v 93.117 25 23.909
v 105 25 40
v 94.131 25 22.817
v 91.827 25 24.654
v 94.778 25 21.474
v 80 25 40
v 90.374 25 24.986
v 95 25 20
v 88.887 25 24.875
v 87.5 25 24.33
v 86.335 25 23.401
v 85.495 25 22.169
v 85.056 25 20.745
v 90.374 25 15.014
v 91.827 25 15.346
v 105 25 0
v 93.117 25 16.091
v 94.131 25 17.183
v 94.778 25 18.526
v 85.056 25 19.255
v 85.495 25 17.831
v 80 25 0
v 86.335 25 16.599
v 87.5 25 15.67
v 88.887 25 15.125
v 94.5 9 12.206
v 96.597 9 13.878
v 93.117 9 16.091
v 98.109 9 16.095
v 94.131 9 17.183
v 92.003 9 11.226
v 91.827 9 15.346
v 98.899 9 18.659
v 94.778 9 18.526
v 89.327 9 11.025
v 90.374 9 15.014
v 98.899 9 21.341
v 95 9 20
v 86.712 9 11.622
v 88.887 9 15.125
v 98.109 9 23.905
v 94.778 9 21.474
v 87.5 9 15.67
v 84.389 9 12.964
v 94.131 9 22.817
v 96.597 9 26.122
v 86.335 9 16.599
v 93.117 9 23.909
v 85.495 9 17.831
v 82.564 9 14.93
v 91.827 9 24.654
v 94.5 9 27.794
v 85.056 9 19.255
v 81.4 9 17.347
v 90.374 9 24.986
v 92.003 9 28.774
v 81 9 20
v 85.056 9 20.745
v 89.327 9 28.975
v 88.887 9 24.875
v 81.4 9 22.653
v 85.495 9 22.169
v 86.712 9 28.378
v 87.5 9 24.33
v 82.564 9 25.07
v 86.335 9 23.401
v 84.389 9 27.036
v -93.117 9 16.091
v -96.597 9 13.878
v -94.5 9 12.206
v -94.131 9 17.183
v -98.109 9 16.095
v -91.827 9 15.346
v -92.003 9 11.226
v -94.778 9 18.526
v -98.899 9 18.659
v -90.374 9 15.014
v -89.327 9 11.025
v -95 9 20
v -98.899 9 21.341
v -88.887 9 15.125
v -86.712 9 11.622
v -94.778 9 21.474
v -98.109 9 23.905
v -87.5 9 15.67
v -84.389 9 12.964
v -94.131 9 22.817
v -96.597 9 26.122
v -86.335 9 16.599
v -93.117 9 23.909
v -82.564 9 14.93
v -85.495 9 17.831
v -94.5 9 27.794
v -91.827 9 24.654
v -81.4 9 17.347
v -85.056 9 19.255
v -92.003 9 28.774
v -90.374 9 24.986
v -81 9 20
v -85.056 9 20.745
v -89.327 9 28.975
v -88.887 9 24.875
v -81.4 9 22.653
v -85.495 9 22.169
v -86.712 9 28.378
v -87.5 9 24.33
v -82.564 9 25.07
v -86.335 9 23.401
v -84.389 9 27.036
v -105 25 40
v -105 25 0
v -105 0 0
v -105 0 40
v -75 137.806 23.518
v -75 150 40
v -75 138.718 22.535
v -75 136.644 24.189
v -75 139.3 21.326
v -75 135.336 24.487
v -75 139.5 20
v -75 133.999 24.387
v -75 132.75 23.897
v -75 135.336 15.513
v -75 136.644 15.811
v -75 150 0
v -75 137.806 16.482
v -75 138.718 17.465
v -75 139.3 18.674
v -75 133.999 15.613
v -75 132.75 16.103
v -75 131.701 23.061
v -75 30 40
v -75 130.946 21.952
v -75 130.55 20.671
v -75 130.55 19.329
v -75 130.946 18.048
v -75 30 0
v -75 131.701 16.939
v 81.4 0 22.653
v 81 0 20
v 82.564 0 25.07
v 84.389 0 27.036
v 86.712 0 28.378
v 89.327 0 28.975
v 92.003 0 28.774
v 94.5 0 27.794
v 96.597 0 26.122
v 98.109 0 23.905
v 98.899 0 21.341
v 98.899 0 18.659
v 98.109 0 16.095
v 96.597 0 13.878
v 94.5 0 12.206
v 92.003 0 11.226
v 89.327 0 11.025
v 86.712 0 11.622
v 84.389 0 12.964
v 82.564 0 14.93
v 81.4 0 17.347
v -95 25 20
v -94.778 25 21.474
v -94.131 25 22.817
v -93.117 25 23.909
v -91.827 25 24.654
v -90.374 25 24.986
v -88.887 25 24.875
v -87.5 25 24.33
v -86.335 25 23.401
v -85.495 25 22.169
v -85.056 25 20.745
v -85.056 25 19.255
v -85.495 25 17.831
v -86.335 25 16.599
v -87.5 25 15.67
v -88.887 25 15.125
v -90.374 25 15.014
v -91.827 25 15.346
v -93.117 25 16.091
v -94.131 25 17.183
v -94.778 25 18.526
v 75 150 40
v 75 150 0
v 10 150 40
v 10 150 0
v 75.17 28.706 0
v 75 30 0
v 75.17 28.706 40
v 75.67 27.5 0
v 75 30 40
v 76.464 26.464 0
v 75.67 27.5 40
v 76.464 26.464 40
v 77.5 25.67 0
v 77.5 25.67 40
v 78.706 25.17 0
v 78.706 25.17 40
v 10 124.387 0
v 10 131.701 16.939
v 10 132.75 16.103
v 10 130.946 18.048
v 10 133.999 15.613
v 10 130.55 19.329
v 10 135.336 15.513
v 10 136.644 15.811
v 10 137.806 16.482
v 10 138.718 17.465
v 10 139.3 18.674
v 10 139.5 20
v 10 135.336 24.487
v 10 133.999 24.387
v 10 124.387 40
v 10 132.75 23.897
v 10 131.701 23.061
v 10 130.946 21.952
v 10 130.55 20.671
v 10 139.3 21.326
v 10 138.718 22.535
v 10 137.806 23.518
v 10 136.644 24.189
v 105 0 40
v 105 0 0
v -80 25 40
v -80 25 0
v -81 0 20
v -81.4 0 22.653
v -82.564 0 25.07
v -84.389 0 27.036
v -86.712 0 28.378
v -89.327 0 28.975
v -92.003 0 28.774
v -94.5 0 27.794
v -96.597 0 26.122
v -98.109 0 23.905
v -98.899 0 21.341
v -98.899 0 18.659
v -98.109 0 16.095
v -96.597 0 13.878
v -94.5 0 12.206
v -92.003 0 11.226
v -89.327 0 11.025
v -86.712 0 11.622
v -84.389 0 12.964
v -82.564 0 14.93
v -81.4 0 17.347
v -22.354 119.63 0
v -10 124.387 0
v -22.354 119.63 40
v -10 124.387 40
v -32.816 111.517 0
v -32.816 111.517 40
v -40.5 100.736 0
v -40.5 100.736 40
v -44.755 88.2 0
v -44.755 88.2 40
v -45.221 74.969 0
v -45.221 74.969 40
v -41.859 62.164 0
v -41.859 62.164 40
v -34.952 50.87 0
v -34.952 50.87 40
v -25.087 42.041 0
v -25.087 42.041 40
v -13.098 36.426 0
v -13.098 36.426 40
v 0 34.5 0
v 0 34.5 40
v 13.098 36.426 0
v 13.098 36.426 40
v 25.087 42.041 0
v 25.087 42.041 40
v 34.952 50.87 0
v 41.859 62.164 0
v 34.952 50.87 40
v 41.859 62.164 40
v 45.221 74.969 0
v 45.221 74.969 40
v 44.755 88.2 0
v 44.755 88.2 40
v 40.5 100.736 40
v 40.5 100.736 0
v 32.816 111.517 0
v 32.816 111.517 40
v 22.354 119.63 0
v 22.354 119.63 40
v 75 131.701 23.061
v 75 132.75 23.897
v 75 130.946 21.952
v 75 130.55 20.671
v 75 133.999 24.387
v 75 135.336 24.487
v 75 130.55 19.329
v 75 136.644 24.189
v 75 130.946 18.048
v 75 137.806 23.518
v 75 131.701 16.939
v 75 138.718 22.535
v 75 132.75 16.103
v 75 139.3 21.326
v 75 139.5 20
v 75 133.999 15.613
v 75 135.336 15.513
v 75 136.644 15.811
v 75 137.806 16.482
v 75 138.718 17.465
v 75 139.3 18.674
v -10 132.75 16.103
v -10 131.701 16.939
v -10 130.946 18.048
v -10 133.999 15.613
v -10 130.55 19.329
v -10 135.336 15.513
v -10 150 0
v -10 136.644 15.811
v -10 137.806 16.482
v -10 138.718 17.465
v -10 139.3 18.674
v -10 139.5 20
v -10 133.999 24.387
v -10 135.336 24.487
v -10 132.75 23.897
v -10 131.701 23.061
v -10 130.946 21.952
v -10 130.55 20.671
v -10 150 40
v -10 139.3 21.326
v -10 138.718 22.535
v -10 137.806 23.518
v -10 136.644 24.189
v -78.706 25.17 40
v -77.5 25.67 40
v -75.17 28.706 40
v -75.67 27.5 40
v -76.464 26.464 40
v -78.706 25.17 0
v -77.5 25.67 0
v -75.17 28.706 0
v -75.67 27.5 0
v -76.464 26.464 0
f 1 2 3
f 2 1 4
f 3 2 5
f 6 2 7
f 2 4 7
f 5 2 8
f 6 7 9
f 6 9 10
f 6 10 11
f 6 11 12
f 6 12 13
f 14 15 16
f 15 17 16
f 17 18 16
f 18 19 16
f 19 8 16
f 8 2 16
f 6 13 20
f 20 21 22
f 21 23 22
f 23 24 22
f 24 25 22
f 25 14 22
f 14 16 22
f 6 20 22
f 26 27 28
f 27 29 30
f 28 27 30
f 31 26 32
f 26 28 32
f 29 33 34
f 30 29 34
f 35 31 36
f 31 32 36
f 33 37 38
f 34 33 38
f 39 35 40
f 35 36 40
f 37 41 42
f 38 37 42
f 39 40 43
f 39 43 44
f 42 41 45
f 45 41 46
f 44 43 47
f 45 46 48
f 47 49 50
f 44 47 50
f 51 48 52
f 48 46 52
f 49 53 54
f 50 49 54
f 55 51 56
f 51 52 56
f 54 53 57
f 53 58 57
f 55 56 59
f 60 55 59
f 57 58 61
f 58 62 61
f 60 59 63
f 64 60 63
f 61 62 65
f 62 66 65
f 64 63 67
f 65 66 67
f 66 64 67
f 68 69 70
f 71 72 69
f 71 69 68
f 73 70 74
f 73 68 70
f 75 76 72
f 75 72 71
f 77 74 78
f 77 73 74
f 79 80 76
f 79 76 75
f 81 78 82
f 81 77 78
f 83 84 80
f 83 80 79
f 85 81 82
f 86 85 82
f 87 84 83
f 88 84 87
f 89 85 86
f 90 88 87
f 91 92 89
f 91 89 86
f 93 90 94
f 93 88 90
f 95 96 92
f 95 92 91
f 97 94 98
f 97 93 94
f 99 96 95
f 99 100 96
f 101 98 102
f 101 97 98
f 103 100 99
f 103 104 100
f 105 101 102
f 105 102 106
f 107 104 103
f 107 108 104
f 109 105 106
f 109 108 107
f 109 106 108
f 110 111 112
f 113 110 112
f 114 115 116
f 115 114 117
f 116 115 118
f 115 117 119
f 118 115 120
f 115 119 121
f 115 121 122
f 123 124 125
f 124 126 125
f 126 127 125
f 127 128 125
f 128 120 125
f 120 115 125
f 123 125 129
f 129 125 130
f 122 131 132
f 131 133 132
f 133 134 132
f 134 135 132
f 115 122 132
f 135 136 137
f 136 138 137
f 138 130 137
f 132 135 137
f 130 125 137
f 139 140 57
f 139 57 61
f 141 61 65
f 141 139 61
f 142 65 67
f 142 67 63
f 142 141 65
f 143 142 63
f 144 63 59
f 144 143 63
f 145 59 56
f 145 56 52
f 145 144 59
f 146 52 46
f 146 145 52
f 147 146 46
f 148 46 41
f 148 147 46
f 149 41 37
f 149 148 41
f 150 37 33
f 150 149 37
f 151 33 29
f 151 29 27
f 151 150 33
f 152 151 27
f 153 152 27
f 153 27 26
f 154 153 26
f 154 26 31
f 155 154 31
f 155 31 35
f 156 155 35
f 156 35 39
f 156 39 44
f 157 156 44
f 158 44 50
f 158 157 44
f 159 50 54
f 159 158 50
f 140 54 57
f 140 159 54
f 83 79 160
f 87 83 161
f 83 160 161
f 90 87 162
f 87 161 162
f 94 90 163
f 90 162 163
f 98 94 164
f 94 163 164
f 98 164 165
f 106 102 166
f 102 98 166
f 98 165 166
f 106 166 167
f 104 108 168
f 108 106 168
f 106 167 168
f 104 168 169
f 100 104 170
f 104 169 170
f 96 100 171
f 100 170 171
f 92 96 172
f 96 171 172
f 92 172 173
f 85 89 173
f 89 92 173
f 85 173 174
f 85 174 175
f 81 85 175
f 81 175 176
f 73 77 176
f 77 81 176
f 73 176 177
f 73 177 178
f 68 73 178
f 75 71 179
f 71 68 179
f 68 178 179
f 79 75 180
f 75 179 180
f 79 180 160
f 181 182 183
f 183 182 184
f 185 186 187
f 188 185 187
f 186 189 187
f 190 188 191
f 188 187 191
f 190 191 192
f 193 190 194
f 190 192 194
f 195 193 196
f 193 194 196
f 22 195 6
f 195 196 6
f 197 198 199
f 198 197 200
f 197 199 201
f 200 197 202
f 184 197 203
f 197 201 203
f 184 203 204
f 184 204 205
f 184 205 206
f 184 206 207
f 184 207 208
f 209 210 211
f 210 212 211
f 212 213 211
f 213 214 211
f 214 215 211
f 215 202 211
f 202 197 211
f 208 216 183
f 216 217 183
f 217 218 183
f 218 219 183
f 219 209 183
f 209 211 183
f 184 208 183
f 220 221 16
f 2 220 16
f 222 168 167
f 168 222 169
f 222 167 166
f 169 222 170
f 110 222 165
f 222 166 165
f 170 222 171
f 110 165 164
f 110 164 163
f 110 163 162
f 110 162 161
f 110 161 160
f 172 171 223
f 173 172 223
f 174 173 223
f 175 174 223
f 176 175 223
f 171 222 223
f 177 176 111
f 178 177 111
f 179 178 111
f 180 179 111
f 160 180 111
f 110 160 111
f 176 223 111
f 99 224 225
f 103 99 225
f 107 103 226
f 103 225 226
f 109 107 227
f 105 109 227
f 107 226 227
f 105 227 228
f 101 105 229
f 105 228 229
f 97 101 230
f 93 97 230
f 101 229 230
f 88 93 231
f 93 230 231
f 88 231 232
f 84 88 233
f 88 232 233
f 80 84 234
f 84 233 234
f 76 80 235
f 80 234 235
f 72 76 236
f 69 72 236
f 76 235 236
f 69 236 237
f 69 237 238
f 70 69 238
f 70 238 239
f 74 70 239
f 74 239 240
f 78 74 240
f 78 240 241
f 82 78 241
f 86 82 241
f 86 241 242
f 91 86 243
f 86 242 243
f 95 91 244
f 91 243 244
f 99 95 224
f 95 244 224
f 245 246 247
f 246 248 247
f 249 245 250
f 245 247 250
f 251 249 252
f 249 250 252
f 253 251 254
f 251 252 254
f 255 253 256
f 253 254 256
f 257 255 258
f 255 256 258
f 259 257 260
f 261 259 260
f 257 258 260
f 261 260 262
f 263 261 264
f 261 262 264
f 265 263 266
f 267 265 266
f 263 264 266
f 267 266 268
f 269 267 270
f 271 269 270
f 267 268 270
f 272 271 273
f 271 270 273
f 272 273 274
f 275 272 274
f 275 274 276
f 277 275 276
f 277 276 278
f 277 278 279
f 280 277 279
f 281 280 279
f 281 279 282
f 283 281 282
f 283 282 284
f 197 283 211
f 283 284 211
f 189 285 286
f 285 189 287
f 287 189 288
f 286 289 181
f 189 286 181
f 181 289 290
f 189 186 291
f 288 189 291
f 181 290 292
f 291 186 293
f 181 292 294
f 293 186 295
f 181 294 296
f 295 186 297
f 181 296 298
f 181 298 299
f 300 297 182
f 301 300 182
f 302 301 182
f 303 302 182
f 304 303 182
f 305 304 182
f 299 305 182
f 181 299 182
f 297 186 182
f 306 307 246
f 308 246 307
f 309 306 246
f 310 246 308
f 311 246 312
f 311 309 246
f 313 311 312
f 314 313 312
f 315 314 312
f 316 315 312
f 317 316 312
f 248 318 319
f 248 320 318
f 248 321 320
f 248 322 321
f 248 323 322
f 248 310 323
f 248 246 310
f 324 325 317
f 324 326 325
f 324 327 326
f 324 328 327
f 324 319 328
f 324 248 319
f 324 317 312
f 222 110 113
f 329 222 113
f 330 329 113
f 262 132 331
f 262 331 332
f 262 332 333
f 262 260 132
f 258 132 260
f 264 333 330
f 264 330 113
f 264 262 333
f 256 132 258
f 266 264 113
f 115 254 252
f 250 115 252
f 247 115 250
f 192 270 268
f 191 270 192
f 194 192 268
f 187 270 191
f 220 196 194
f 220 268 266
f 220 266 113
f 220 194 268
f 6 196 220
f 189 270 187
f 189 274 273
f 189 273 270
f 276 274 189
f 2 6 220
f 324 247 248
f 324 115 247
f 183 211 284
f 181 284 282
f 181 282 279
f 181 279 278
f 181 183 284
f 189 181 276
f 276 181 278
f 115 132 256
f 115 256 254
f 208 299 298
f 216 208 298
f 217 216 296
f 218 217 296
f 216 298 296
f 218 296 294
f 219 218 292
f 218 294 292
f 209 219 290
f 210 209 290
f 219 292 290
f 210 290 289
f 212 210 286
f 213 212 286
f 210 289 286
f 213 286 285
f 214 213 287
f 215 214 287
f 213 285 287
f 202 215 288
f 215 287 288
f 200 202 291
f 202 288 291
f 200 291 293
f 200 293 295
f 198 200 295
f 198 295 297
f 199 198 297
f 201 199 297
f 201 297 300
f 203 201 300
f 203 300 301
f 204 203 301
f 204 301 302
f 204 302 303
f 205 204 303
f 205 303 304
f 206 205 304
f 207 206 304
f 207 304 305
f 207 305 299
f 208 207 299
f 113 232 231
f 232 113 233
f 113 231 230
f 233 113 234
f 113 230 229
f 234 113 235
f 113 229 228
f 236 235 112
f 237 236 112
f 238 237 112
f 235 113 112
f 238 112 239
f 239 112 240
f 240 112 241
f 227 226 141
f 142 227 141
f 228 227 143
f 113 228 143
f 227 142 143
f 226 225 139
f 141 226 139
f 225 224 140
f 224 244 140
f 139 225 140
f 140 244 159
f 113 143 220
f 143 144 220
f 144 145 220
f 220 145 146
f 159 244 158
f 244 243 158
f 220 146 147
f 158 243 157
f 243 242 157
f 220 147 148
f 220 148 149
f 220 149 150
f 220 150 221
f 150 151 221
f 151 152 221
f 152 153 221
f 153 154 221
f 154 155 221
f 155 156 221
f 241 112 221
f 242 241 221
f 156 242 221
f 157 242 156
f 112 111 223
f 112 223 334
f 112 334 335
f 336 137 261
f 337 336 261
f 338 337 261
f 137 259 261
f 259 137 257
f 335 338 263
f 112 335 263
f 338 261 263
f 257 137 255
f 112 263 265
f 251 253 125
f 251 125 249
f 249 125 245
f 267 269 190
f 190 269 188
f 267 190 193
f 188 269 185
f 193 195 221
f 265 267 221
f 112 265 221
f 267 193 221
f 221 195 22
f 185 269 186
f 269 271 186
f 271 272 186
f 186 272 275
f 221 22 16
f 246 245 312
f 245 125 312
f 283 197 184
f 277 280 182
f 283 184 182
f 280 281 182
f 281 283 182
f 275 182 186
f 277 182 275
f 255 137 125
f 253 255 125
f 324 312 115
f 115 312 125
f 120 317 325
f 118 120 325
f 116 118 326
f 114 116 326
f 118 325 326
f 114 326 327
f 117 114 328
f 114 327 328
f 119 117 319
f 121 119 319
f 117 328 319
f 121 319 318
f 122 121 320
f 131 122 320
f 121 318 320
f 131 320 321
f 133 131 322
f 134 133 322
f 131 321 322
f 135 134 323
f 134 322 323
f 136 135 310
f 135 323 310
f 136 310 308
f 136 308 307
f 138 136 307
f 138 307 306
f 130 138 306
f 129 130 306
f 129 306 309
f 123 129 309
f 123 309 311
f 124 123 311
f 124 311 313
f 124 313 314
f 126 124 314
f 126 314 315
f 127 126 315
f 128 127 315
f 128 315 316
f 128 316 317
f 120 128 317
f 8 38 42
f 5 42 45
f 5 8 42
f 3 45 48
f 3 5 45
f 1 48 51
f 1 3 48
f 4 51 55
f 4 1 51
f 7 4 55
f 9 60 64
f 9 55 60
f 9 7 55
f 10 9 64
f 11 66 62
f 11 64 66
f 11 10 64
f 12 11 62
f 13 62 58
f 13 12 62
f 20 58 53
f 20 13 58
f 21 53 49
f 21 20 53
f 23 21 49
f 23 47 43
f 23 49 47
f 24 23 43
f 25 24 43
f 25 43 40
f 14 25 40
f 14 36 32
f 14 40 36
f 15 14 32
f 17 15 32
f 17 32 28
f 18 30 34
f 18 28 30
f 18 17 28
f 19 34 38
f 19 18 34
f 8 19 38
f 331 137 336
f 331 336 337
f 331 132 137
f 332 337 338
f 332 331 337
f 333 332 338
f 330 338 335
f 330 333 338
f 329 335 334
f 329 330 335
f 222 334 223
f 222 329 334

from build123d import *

# Parameters (mm, degrees)
F1_DEPTH  = 40
F2_R      = 45.5
F3_DEPTH  = 40.001
F4_W      = 20
F4_H      = 25.6125017601
F5_DEPTH  = 40.001
F6_R      = 4.5
F7_DEPTH  = 180.001
F8_R      = 5
F9_DEPTH  = 25.001
F10_R     = 9
F10_R_2   = 5
F11_DEPTH = 9
F12_R     = 5


# Not quite as in the source:
# - a pattern or mirror of a feature is missing from the dataset's text; its kind, count and spacing are read off the source's solid


with BuildPart() as f1:
    # F0 (on Top) → F1 (new body)
    with BuildSketch(Plane.XY):
        Polygon((-105, 25), (-105, 0), (105, 0), (105, 25), (75, 25), (75, 150), (-75, 150), (-75, 25), align=None)
    extrude(amount=F1_DEPTH)

    # F2 (on face) → F3 (cut, through all)
    with BuildSketch(Plane.XY.offset(40)):
        with Locations((0, 80)):
            Circle(F2_R)
    extrude(amount=-F3_DEPTH, mode=Mode.SUBTRACT)

    # F4 (on face) → F5 (cut, through all)
    with BuildSketch(Plane.XY.offset(40)):
        with Locations((0, 137.19374912)):
            Rectangle(F4_W, F4_H)
    extrude(amount=-F5_DEPTH, mode=Mode.SUBTRACT)

    # F6 (on face) → F7 (cut, through all)
    with BuildSketch(Plane.YZ.offset(75)):
        with Locations((135, 20)):
            Circle(F6_R)
    extrude(amount=-F7_DEPTH, mode=Mode.SUBTRACT)

    # F8 (on face) → F9 (cut, through all)
    with BuildSketch(Plane(origin=(0, 25, 0), x_dir=(-1, 0, 0), z_dir=(0, 1, 0))):
        with Locations((90, 20)):
            Circle(F8_R)
    f9 = extrude(amount=-F9_DEPTH, mode=Mode.SUBTRACT)

    # F9_copies: F9 across plane
    add(f9.mirror(Plane(origin=(0, 0, 0), x_dir=(0, 0, 1), z_dir=(1, 0, 0))), mode=Mode.SUBTRACT)

    # F10 (on face) → F11 (cut)
    with BuildSketch(Plane.XZ):
        with Locations((-90, 20)):
            Circle(F10_R)
        with Locations((-90, 20)):
            Circle(F10_R_2, mode=Mode.SUBTRACT)
    f11 = extrude(amount=-F11_DEPTH, mode=Mode.SUBTRACT)

    # F11_copies: F11 across plane
    add(f11.mirror(Plane(origin=(0, 0, 0), x_dir=(0, 0, 1), z_dir=(1, 0, 0))), mode=Mode.SUBTRACT)

    # F12
    f12_edges = [f1.edges().sort_by_distance(p)[0] for p in [
        (-75, 25, 20),
        (75, 25, 20),
    ]]
    fillet(f12_edges, radius=F12_R)


solid = f1.part
